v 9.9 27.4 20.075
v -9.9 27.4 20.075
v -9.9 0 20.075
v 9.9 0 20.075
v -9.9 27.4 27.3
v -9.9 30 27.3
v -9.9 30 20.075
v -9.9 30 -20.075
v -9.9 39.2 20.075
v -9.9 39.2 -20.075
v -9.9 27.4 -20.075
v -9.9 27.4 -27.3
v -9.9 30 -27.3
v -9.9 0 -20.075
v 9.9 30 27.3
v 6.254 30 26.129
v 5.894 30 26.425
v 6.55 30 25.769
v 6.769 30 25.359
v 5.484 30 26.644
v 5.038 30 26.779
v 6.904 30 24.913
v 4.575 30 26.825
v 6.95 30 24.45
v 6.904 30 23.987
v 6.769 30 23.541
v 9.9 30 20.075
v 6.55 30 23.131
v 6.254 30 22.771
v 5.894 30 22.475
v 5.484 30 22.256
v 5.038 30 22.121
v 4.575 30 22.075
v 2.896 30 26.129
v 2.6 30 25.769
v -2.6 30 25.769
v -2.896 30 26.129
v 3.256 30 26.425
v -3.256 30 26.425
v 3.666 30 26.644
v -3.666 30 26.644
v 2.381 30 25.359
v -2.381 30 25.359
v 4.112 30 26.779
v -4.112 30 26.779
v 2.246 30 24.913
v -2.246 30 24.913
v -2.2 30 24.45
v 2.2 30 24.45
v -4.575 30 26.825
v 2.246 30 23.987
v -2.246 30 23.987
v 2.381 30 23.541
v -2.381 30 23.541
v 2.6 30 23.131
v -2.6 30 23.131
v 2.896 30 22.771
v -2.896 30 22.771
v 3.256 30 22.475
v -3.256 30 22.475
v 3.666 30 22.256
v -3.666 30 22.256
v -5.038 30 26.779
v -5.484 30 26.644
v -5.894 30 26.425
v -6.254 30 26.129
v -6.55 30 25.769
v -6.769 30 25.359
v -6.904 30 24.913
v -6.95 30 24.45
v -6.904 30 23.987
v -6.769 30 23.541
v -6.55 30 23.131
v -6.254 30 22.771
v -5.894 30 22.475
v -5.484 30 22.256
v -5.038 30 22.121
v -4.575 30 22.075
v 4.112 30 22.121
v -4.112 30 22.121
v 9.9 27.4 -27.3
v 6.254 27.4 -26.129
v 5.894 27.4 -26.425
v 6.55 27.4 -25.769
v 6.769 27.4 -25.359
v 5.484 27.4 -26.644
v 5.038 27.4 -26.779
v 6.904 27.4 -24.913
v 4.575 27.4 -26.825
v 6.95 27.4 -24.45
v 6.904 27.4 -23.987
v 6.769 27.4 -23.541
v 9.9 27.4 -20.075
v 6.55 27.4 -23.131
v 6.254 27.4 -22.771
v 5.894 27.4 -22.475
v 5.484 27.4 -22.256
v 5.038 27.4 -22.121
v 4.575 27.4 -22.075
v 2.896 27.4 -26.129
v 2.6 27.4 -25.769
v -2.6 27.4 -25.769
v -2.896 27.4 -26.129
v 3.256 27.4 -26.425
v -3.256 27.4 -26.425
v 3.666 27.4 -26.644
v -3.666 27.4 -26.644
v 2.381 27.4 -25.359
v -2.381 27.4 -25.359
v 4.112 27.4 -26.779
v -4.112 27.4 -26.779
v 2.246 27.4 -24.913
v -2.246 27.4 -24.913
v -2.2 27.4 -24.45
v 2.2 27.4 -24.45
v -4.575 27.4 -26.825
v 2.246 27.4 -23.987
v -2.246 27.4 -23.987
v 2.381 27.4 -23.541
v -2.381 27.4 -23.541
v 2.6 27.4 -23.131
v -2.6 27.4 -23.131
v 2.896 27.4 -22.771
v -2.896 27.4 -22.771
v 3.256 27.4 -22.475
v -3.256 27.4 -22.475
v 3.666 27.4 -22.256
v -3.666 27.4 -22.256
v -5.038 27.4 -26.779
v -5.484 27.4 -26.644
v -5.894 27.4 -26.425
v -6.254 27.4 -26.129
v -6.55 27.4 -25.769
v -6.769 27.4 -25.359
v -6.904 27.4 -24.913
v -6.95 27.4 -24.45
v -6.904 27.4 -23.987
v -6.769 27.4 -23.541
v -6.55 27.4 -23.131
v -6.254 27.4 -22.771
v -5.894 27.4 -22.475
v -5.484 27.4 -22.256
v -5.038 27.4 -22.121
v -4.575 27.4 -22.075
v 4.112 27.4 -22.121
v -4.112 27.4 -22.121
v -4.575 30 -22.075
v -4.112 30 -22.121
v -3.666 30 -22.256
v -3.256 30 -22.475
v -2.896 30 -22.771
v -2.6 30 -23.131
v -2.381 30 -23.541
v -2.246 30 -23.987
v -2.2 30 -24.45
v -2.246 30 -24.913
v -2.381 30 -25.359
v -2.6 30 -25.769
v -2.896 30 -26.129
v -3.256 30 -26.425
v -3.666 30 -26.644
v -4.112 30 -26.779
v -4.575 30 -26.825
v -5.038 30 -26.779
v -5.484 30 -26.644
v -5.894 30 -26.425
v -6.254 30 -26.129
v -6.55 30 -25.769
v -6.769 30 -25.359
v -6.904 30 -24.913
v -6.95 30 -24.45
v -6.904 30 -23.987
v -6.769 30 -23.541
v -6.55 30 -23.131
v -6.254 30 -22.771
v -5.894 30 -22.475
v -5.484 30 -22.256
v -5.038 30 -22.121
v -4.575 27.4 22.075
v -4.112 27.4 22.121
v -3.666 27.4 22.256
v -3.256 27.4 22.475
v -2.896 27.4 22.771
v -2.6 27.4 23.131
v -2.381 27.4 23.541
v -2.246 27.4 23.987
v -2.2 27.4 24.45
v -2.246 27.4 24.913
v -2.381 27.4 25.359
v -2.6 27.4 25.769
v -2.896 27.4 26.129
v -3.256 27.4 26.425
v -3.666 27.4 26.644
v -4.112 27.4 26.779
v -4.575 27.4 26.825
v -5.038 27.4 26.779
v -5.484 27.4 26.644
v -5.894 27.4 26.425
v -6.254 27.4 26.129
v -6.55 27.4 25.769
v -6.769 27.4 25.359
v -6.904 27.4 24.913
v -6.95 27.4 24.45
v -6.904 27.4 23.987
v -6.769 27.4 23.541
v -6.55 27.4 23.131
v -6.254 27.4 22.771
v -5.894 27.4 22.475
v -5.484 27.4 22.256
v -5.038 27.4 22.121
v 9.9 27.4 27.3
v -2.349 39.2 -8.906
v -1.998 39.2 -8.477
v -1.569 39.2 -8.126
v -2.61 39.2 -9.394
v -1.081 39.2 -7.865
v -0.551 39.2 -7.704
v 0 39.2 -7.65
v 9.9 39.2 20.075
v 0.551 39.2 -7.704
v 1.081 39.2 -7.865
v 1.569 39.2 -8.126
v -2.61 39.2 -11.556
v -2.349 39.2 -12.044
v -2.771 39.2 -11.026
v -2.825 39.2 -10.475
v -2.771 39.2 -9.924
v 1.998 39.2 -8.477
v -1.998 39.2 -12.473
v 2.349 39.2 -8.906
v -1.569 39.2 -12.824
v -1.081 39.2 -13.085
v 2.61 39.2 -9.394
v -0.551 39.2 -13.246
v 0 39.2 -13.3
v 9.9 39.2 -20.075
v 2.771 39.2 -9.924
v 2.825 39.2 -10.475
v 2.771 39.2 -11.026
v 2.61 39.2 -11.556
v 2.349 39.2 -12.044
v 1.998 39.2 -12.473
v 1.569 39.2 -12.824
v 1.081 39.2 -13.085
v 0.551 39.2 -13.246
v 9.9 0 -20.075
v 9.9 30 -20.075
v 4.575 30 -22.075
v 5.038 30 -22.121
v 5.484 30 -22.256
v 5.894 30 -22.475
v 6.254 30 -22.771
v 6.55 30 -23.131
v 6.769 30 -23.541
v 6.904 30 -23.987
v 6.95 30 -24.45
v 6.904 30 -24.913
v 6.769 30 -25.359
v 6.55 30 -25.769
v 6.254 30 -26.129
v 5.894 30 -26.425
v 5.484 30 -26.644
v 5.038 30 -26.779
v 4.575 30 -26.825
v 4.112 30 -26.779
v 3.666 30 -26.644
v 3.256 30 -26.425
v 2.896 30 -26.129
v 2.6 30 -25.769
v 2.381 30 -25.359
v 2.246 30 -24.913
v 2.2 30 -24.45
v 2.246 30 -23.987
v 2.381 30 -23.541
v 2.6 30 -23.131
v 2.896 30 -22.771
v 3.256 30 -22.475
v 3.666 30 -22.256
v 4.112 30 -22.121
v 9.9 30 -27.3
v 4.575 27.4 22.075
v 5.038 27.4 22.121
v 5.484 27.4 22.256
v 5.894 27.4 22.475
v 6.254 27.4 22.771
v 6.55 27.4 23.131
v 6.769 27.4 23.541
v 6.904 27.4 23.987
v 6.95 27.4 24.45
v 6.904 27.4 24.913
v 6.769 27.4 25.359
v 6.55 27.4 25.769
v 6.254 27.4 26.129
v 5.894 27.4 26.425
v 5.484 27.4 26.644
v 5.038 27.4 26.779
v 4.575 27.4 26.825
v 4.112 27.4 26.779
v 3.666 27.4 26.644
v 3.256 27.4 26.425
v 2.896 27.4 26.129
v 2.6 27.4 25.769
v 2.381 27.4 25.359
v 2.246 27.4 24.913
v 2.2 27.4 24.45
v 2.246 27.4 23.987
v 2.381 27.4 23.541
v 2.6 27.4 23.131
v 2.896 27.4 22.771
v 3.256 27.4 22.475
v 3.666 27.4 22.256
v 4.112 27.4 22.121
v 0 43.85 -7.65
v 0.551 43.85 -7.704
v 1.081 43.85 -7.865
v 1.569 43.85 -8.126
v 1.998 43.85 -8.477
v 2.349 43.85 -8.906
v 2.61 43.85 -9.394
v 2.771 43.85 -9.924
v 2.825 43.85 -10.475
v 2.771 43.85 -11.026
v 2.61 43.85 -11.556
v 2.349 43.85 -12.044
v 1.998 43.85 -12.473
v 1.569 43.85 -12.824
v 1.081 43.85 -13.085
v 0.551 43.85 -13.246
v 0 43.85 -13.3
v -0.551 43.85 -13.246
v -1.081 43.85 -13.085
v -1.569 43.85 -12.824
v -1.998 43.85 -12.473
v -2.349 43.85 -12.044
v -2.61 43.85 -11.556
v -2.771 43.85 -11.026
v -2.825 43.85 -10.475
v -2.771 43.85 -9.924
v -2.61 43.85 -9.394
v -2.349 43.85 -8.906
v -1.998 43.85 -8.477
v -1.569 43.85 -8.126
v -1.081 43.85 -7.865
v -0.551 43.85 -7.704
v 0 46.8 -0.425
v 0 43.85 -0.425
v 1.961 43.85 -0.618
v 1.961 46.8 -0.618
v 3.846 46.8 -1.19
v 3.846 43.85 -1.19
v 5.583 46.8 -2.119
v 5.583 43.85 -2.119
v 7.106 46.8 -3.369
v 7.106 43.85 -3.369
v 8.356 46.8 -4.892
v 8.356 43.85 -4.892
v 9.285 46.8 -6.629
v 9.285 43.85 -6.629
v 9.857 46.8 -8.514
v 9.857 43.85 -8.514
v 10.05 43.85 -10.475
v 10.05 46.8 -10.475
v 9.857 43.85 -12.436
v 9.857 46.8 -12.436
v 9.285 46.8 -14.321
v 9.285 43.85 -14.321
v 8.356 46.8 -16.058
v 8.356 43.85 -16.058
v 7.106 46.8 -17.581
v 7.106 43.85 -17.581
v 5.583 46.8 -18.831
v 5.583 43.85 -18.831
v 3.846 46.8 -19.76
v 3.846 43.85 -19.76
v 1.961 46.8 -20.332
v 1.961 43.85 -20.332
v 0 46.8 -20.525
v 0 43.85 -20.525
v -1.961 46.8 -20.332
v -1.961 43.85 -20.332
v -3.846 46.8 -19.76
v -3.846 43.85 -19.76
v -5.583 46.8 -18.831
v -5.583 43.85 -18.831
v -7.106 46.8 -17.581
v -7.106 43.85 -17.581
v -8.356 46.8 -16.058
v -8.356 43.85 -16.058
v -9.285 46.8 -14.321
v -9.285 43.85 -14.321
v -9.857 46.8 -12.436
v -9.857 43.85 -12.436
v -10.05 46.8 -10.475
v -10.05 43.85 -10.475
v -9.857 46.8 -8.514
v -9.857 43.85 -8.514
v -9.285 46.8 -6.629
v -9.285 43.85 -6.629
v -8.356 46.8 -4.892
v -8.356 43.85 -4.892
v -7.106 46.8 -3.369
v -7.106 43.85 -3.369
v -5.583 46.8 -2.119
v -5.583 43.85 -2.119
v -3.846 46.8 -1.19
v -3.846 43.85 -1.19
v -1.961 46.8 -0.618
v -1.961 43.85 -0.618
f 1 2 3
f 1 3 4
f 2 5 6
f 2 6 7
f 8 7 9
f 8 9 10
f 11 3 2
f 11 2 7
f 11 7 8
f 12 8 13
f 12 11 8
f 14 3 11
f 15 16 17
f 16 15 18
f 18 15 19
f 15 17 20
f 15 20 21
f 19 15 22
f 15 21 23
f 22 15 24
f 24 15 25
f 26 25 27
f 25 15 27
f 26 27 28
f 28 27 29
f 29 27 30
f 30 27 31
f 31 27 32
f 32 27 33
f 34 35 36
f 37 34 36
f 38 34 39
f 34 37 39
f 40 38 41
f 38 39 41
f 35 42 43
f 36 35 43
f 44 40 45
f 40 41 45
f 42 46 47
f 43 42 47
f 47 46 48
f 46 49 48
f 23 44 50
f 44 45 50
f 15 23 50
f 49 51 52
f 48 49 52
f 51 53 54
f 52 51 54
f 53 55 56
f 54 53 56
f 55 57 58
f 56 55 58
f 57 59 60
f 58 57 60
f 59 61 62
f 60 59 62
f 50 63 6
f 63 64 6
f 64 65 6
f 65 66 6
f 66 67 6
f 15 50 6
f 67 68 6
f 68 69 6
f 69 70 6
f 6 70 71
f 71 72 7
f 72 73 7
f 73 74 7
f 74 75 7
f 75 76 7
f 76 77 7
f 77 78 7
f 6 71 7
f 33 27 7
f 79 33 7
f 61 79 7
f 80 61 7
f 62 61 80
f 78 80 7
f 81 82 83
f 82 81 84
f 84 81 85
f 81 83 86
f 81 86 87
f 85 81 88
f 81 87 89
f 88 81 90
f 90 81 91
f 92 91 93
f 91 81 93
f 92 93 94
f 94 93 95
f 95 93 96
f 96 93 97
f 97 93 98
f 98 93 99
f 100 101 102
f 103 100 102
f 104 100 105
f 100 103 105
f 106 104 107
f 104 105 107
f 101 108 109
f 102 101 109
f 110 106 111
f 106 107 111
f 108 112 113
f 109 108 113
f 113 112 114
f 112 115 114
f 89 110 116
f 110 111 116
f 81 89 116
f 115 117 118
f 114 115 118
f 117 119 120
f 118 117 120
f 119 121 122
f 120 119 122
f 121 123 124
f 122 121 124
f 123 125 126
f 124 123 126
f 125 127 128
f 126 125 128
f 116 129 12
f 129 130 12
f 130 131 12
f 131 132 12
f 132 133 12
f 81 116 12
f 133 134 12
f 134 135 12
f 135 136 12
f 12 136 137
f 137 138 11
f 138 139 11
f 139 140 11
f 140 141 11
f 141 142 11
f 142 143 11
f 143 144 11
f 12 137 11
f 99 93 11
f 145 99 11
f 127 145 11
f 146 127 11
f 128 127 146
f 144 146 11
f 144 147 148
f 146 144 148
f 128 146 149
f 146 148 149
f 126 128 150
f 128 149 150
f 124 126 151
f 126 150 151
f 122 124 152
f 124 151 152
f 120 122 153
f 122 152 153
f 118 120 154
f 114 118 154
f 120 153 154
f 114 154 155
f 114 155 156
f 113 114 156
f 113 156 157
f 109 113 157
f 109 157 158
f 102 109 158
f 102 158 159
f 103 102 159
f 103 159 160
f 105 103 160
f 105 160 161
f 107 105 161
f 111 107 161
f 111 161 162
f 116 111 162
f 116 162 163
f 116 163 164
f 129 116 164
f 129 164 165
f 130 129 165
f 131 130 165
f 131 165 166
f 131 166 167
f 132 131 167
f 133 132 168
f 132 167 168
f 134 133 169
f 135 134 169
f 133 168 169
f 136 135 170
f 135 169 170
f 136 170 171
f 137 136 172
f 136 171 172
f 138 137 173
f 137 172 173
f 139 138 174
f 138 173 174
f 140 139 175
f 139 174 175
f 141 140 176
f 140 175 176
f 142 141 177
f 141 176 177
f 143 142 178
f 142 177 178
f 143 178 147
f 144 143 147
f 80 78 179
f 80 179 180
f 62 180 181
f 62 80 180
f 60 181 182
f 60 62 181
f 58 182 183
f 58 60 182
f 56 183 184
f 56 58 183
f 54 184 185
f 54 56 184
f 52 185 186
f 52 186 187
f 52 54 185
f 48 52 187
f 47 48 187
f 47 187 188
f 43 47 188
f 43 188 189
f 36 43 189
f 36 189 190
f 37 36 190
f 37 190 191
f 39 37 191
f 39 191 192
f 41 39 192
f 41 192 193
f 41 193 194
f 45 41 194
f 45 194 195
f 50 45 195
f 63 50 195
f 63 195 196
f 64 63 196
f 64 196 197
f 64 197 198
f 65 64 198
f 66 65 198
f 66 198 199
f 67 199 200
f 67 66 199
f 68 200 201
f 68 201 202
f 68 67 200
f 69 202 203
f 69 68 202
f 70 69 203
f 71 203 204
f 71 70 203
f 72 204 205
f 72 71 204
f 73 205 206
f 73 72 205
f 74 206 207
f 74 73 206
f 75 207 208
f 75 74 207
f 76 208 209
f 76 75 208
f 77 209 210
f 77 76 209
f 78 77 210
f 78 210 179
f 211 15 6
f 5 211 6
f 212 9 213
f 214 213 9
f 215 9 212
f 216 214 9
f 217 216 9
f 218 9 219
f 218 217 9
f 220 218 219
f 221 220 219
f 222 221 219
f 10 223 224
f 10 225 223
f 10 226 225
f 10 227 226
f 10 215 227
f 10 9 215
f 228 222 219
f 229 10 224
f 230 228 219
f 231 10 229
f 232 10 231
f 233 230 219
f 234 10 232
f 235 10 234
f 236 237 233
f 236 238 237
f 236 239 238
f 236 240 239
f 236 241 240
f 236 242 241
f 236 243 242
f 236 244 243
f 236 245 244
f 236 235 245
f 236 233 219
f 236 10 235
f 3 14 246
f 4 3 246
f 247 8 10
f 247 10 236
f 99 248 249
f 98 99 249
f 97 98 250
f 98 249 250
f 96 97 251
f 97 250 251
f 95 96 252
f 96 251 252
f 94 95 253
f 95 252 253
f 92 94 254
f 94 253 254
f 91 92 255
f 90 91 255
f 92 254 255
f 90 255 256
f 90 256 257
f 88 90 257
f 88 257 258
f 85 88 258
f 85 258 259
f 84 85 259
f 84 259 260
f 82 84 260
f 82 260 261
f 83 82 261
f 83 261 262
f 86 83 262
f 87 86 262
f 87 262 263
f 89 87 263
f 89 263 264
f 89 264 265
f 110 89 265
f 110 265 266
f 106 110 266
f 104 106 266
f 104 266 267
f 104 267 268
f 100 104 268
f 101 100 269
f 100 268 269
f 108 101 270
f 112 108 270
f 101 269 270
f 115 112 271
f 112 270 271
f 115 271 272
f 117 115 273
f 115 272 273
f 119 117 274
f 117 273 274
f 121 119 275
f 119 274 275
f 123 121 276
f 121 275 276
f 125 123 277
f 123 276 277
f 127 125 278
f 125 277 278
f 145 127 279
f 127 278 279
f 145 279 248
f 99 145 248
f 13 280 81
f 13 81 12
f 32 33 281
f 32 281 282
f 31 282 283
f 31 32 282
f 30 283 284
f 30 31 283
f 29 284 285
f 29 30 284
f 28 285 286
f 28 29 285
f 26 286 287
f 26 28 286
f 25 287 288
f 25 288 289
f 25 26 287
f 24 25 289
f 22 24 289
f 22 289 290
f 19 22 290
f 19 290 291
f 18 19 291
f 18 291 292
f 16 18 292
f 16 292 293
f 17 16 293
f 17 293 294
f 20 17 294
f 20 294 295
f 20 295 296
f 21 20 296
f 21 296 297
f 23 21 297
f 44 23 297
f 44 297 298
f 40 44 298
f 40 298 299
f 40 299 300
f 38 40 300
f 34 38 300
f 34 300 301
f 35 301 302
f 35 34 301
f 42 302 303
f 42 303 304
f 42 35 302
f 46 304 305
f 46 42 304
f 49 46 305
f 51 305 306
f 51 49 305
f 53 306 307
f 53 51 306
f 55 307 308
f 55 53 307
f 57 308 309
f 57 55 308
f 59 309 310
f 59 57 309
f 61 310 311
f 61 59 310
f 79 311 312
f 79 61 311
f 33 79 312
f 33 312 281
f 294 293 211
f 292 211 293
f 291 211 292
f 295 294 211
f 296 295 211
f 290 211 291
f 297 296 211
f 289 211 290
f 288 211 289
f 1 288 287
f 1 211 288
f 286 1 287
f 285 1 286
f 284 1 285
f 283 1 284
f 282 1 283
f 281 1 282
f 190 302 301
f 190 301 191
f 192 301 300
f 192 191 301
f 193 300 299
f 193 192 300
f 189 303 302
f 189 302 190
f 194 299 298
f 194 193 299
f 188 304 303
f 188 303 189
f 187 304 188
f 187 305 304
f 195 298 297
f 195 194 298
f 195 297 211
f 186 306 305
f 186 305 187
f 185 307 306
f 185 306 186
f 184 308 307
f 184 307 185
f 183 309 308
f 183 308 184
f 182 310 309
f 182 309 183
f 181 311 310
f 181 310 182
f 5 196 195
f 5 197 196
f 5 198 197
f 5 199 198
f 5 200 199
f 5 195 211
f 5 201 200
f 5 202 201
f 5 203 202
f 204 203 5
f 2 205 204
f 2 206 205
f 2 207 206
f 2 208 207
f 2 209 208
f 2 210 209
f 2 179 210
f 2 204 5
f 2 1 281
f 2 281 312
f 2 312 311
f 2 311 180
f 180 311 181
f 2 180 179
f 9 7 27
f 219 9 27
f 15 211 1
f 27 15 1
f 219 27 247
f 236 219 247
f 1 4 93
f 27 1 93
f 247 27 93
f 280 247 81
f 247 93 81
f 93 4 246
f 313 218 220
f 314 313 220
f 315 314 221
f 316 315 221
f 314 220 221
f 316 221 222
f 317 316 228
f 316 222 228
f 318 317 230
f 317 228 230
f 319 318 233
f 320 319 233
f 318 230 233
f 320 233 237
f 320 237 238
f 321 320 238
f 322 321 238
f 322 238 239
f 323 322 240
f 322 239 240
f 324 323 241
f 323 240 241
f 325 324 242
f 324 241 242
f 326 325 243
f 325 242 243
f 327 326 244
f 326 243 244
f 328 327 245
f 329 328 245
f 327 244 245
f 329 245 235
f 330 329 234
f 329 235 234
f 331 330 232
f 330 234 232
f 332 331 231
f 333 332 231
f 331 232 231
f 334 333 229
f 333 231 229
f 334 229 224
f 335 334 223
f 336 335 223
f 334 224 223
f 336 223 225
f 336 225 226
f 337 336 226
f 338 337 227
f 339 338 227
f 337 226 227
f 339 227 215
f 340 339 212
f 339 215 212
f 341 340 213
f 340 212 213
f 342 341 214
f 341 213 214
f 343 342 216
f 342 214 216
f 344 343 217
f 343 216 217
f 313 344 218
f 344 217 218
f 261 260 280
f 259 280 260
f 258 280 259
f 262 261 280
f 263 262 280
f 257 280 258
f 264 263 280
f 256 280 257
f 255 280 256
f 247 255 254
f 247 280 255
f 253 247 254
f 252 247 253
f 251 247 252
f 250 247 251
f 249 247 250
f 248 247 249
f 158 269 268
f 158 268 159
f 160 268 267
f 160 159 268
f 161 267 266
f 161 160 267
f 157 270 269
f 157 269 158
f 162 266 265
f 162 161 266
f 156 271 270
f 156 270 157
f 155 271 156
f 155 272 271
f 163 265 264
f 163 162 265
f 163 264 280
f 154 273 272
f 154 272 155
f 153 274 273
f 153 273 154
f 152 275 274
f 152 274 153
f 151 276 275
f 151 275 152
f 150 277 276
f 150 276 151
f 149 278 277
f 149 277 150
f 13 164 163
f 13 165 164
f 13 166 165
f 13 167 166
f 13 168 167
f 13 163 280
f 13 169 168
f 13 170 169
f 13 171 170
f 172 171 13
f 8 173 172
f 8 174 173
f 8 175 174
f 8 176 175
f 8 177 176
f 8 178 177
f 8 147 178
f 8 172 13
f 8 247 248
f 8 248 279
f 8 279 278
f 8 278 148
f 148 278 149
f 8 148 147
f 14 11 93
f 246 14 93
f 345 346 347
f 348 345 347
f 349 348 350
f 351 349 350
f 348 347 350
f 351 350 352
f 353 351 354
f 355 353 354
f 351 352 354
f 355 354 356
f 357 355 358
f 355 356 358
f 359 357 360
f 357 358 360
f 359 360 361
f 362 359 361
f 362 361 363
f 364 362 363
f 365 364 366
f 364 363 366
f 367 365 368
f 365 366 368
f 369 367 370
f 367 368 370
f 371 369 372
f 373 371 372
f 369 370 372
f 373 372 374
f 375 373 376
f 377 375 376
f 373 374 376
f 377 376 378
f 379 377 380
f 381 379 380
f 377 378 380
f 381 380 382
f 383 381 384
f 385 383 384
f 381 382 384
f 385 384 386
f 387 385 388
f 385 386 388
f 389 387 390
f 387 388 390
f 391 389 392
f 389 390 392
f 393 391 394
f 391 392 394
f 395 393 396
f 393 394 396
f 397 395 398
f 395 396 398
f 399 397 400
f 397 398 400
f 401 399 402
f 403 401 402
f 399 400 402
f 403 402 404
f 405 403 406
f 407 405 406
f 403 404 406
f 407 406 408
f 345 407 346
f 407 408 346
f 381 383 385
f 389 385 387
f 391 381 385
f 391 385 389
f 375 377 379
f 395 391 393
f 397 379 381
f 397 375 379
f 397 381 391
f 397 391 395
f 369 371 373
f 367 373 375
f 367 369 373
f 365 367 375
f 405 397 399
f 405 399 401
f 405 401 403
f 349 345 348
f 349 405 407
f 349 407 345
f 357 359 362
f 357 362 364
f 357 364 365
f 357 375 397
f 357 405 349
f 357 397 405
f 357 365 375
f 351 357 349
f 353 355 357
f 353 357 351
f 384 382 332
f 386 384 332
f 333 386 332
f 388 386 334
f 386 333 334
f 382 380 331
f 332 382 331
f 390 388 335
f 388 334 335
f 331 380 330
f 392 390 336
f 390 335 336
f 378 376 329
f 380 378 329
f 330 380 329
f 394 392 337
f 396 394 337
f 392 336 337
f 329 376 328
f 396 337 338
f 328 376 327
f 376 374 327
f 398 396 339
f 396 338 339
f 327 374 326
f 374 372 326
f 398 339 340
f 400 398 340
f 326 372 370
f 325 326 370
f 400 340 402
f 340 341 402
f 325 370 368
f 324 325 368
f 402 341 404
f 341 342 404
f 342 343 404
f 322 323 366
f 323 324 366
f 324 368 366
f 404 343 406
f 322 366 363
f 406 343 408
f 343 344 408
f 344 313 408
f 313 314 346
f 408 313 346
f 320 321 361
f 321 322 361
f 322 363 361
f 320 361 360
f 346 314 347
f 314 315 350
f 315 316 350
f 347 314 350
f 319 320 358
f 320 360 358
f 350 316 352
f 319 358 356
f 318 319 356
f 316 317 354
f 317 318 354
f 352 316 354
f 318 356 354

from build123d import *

# Parameters (mm, degrees)
SKETCH1_W           = 19.8
SKETCH1_H           = 40.15
BOSS_EXTRUDE1_DEPTH = 39.2
SKETCH4_W           = 19.8
SKETCH4_H           = 2.6
BOSS_EXTRUDE2_DEPTH = 7.225
CUT_EXTRUDE1_REACH  = 43.753
SKETCH5_R           = 2.375
SKETCH6_R           = 2.825
BOSS_EXTRUDE3_DEPTH = 4.65
SKETCH8_R           = 10.05
BOSS_EXTRUDE4_DEPTH = 2.95


with BuildPart() as part:
    # Sketch1 → Boss-Extrude1 (new body)
    with BuildSketch(Plane(origin=(0, 0, 0), x_dir=(1, 0, 0), z_dir=(0, 1, 0))):
        Rectangle(SKETCH1_W, SKETCH1_H)
    extrude(amount=BOSS_EXTRUDE1_DEPTH)

    # Sketch4 → Boss-Extrude2 (add)
    with BuildSketch(Plane(origin=(0, 0, -20.075), x_dir=(-1, 0, 0), z_dir=(0, 0, -1))):
        with Locations((0, 28.7)):
            Rectangle(SKETCH4_W, SKETCH4_H)
    boss_extrude2 = extrude(amount=BOSS_EXTRUDE2_DEPTH)

    # Sketch5 → Cut-Extrude1 (cut, up to next)
    with BuildSketch(Plane(origin=(0, 30, 0), x_dir=(1, 0, 0), z_dir=(0, 1, 0)), mode=Mode.PRIVATE) as cut_extrude1_sk1:
        with Locations(Location((4.575, 24.45, 0), (0, 0, 270))):
            Circle(SKETCH5_R)
    cut_extrude1_tool1 = extrude(cut_extrude1_sk1.sketch, amount=-CUT_EXTRUDE1_REACH, mode=Mode.PRIVATE) & part.part
    # Sketch5 → Cut-Extrude1 (cut, up to next)
    with BuildSketch(Plane(origin=(0, 30, 0), x_dir=(1, 0, 0), z_dir=(0, 1, 0)), mode=Mode.PRIVATE) as cut_extrude1_sk2:
        with Locations(Location((-4.575, 24.45, 0), (0, 0, 270))):
            Circle(SKETCH5_R)
    cut_extrude1_tool2 = extrude(cut_extrude1_sk2.sketch, amount=-CUT_EXTRUDE1_REACH, mode=Mode.PRIVATE) & part.part
    cut_extrude1_1 = cut_extrude1_tool1.solids().sort_by_distance((4.575, 30, -24.45))[0]
    add(cut_extrude1_1, mode=Mode.SUBTRACT)
    cut_extrude1_2 = cut_extrude1_tool2.solids().sort_by_distance((-4.575, 30, -24.45))[0]
    add(cut_extrude1_2, mode=Mode.SUBTRACT)
    cut_extrude1 = cut_extrude1_1 + cut_extrude1_2  # Cut-Extrude1 as one shape, for the pattern or mirror that repeats it

    # Mirror2: Boss-Extrude2, Cut-Extrude1 across plane
    add(boss_extrude2.mirror(Plane.XY))
    add(cut_extrude1.mirror(Plane.XY), mode=Mode.SUBTRACT)

    # Sketch6 → Boss-Extrude3 (add)
    with BuildSketch(Plane(origin=(0, 39.2, 0), x_dir=(1, 0, 0), z_dir=(0, 1, 0))):
        with Locations(Location((0, 10.475, 0), (0, 0, 270))):
            Circle(SKETCH6_R)
    extrude(amount=BOSS_EXTRUDE3_DEPTH)

    # Sketch8 → Boss-Extrude4 (add)
    with BuildSketch(Plane(origin=(0, 43.85, 0), x_dir=(1, 0, 0), z_dir=(0, 1, 0))):
        with Locations(Location((0, 10.475, 0), (0, 0, 270))):
            Circle(SKETCH8_R)
    extrude(amount=BOSS_EXTRUDE4_DEPTH)


solid = part.part
